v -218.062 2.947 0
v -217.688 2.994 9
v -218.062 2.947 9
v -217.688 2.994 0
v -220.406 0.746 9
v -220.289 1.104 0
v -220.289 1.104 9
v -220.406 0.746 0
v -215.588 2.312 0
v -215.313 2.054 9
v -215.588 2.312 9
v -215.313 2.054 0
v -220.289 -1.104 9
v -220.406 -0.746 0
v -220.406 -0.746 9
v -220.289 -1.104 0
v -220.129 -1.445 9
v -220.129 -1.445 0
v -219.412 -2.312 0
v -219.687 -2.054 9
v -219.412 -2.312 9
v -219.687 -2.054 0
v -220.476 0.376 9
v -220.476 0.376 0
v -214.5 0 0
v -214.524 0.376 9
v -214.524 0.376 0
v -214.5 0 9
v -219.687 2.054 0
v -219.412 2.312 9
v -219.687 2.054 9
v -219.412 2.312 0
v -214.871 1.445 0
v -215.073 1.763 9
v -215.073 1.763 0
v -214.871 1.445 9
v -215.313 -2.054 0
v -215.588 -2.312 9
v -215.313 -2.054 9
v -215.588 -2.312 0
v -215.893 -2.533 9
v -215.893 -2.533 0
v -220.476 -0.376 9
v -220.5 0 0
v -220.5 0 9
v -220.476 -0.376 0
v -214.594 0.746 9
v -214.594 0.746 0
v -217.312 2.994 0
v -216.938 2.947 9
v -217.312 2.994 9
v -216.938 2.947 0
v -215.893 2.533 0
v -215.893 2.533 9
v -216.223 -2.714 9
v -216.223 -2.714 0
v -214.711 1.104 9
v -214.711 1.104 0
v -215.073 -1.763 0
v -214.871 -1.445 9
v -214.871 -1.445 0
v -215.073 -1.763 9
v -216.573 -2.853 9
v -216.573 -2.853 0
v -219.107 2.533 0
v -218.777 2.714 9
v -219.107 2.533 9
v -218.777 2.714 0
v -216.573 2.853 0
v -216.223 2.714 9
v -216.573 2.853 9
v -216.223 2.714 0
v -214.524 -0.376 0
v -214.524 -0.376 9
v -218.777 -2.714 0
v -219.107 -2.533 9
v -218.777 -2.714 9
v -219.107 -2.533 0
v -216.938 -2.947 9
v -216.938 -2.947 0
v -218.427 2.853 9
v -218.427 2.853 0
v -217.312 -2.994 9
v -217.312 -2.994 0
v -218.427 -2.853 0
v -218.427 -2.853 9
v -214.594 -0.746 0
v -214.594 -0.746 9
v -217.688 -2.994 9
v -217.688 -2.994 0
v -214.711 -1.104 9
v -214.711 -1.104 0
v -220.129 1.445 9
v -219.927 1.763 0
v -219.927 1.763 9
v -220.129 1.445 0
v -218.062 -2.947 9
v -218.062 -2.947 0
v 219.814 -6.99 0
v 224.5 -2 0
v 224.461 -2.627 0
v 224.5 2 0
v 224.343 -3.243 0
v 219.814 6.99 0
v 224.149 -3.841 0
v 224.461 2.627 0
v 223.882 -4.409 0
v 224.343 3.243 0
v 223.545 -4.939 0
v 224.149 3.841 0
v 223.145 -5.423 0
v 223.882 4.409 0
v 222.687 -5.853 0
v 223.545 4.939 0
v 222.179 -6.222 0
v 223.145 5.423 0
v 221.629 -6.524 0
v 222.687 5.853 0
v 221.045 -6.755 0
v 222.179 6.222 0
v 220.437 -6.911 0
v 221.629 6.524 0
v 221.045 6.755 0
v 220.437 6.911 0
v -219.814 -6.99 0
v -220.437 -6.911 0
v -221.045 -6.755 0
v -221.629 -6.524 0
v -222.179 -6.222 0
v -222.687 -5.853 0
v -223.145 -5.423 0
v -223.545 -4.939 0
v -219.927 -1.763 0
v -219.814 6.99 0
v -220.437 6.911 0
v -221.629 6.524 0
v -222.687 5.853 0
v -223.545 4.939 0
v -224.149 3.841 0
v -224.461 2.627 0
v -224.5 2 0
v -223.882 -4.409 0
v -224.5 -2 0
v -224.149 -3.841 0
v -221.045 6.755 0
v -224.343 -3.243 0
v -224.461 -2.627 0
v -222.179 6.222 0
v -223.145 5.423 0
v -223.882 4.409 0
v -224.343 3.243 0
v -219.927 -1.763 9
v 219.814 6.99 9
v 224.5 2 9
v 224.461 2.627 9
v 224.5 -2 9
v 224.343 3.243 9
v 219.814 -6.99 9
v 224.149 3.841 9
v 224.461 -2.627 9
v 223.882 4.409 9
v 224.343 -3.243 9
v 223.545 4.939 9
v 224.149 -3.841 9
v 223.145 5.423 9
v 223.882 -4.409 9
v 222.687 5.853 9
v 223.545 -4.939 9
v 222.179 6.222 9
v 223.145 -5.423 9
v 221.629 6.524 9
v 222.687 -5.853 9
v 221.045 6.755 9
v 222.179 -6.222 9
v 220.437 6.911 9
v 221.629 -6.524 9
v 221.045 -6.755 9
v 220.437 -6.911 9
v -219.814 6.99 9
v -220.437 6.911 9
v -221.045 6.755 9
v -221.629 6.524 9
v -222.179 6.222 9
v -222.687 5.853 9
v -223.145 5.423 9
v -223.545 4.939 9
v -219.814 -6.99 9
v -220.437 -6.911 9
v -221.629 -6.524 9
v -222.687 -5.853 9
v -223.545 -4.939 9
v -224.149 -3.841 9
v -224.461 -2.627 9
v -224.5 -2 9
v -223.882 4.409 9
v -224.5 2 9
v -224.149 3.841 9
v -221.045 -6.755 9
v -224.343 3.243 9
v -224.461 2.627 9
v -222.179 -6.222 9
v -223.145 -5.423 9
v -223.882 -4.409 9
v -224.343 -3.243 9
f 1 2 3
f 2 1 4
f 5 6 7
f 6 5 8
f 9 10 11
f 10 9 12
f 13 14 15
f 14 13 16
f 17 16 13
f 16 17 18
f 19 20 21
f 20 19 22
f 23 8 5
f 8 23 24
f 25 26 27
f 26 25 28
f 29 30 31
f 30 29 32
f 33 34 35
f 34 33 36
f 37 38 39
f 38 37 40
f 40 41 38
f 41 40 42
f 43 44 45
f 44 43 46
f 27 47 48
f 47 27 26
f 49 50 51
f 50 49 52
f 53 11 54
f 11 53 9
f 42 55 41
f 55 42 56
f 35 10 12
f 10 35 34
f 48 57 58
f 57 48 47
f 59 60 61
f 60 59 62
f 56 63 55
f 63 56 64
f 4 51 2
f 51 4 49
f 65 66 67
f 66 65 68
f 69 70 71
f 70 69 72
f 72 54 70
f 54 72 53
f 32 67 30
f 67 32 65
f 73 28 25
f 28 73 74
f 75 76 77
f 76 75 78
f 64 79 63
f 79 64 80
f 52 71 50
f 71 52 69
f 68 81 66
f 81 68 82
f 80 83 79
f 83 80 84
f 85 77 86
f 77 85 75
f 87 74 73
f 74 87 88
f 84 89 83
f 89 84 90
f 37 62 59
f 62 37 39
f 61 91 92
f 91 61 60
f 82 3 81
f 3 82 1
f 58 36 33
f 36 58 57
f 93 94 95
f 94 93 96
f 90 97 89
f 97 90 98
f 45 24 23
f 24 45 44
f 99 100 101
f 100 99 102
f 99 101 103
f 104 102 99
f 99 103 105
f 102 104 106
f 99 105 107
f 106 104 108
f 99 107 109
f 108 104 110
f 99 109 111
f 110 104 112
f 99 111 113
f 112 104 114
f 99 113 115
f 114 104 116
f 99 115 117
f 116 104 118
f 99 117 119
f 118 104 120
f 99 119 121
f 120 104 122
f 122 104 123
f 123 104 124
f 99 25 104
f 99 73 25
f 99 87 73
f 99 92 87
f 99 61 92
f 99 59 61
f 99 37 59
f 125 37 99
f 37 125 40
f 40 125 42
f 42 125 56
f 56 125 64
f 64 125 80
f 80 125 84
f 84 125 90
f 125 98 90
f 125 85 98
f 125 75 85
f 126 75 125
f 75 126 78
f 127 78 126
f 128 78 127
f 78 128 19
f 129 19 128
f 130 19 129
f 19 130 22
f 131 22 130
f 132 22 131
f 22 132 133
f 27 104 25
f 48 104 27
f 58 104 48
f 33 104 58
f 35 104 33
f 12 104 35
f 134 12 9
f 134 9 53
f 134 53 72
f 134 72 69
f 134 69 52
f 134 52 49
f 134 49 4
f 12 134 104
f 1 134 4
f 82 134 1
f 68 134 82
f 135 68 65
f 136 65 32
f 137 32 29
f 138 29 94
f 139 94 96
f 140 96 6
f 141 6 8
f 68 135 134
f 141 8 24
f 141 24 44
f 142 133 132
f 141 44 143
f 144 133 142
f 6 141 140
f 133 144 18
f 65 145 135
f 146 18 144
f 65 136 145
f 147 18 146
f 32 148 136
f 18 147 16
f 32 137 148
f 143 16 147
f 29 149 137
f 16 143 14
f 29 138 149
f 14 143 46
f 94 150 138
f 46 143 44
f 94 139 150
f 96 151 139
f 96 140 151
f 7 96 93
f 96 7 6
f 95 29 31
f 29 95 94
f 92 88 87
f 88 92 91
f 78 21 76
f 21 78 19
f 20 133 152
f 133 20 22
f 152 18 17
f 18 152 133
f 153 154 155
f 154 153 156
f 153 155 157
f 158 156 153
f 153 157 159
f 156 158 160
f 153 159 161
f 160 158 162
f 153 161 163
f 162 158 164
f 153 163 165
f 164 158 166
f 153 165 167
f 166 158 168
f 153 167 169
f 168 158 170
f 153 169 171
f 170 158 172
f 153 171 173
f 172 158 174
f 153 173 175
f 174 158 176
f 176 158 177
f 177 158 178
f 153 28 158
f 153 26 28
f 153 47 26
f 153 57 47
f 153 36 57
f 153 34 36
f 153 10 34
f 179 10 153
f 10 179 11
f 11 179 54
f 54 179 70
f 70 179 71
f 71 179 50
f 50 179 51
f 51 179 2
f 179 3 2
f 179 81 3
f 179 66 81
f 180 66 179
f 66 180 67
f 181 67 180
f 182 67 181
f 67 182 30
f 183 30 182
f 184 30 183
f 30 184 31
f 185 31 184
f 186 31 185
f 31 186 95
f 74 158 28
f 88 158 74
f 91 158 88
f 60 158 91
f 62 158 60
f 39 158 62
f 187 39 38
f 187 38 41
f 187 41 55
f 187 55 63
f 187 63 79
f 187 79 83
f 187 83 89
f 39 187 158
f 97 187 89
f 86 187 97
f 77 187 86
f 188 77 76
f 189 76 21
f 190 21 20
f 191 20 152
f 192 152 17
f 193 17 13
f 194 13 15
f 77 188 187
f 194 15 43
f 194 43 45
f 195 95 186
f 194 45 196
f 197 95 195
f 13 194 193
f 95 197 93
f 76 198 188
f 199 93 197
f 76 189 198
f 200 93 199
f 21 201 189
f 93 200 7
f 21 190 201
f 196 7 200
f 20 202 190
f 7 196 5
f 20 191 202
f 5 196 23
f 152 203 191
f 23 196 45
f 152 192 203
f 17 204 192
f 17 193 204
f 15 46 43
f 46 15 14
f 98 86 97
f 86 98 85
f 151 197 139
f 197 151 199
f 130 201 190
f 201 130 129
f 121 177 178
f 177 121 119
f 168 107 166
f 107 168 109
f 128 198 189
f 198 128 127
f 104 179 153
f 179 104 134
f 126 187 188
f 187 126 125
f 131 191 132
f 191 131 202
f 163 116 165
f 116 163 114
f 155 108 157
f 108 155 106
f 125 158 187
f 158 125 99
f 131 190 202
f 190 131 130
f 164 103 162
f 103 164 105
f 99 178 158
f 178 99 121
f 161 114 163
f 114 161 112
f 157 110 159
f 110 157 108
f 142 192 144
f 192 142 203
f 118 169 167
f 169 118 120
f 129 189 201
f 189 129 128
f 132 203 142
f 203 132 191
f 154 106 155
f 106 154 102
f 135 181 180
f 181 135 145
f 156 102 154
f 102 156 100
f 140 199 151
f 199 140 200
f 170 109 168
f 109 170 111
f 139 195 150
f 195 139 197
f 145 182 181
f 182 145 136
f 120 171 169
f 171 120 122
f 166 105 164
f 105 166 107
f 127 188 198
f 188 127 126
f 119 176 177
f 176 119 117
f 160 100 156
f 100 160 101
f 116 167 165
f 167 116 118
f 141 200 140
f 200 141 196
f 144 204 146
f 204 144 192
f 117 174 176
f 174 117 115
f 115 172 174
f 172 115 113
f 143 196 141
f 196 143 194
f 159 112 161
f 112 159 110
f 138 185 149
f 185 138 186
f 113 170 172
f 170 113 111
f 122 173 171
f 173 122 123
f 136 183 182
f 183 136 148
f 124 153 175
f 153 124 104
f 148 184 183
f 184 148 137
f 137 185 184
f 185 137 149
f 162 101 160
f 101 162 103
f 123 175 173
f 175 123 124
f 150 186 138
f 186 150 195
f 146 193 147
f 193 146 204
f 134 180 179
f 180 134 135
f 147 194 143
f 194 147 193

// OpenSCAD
$fn = 50;


difference() {
	union() {
		hull() {
			translate(v = [-219.5000000000, 2.0000000000, 0]) {
				cylinder(h = 9, r = 5);
			}
			translate(v = [219.5000000000, 2.0000000000, 0]) {
				cylinder(h = 9, r = 5);
			}
			translate(v = [-219.5000000000, -2.0000000000, 0]) {
				cylinder(h = 9, r = 5);
			}
			translate(v = [219.5000000000, -2.0000000000, 0]) {
				cylinder(h = 9, r = 5);
			}
		}
	}
	union() {
		translate(v = [-217.5000000000, 0.0000000000, 0]) {
			cylinder(h = 9, r = 3.0000000000);
		}
		translate(v = [-217.5000000000, 0.0000000000, 0]) {
			cylinder(h = 9, r = 1.5000000000);
		}
		translate(v = [-217.5000000000, 0.0000000000, 0]) {
			cylinder(h = 9, r = 1.5000000000);
		}
		translate(v = [-217.5000000000, 0.0000000000, 0]) {
			cylinder(h = 9, r = 1.5000000000);
		}
	}
}
